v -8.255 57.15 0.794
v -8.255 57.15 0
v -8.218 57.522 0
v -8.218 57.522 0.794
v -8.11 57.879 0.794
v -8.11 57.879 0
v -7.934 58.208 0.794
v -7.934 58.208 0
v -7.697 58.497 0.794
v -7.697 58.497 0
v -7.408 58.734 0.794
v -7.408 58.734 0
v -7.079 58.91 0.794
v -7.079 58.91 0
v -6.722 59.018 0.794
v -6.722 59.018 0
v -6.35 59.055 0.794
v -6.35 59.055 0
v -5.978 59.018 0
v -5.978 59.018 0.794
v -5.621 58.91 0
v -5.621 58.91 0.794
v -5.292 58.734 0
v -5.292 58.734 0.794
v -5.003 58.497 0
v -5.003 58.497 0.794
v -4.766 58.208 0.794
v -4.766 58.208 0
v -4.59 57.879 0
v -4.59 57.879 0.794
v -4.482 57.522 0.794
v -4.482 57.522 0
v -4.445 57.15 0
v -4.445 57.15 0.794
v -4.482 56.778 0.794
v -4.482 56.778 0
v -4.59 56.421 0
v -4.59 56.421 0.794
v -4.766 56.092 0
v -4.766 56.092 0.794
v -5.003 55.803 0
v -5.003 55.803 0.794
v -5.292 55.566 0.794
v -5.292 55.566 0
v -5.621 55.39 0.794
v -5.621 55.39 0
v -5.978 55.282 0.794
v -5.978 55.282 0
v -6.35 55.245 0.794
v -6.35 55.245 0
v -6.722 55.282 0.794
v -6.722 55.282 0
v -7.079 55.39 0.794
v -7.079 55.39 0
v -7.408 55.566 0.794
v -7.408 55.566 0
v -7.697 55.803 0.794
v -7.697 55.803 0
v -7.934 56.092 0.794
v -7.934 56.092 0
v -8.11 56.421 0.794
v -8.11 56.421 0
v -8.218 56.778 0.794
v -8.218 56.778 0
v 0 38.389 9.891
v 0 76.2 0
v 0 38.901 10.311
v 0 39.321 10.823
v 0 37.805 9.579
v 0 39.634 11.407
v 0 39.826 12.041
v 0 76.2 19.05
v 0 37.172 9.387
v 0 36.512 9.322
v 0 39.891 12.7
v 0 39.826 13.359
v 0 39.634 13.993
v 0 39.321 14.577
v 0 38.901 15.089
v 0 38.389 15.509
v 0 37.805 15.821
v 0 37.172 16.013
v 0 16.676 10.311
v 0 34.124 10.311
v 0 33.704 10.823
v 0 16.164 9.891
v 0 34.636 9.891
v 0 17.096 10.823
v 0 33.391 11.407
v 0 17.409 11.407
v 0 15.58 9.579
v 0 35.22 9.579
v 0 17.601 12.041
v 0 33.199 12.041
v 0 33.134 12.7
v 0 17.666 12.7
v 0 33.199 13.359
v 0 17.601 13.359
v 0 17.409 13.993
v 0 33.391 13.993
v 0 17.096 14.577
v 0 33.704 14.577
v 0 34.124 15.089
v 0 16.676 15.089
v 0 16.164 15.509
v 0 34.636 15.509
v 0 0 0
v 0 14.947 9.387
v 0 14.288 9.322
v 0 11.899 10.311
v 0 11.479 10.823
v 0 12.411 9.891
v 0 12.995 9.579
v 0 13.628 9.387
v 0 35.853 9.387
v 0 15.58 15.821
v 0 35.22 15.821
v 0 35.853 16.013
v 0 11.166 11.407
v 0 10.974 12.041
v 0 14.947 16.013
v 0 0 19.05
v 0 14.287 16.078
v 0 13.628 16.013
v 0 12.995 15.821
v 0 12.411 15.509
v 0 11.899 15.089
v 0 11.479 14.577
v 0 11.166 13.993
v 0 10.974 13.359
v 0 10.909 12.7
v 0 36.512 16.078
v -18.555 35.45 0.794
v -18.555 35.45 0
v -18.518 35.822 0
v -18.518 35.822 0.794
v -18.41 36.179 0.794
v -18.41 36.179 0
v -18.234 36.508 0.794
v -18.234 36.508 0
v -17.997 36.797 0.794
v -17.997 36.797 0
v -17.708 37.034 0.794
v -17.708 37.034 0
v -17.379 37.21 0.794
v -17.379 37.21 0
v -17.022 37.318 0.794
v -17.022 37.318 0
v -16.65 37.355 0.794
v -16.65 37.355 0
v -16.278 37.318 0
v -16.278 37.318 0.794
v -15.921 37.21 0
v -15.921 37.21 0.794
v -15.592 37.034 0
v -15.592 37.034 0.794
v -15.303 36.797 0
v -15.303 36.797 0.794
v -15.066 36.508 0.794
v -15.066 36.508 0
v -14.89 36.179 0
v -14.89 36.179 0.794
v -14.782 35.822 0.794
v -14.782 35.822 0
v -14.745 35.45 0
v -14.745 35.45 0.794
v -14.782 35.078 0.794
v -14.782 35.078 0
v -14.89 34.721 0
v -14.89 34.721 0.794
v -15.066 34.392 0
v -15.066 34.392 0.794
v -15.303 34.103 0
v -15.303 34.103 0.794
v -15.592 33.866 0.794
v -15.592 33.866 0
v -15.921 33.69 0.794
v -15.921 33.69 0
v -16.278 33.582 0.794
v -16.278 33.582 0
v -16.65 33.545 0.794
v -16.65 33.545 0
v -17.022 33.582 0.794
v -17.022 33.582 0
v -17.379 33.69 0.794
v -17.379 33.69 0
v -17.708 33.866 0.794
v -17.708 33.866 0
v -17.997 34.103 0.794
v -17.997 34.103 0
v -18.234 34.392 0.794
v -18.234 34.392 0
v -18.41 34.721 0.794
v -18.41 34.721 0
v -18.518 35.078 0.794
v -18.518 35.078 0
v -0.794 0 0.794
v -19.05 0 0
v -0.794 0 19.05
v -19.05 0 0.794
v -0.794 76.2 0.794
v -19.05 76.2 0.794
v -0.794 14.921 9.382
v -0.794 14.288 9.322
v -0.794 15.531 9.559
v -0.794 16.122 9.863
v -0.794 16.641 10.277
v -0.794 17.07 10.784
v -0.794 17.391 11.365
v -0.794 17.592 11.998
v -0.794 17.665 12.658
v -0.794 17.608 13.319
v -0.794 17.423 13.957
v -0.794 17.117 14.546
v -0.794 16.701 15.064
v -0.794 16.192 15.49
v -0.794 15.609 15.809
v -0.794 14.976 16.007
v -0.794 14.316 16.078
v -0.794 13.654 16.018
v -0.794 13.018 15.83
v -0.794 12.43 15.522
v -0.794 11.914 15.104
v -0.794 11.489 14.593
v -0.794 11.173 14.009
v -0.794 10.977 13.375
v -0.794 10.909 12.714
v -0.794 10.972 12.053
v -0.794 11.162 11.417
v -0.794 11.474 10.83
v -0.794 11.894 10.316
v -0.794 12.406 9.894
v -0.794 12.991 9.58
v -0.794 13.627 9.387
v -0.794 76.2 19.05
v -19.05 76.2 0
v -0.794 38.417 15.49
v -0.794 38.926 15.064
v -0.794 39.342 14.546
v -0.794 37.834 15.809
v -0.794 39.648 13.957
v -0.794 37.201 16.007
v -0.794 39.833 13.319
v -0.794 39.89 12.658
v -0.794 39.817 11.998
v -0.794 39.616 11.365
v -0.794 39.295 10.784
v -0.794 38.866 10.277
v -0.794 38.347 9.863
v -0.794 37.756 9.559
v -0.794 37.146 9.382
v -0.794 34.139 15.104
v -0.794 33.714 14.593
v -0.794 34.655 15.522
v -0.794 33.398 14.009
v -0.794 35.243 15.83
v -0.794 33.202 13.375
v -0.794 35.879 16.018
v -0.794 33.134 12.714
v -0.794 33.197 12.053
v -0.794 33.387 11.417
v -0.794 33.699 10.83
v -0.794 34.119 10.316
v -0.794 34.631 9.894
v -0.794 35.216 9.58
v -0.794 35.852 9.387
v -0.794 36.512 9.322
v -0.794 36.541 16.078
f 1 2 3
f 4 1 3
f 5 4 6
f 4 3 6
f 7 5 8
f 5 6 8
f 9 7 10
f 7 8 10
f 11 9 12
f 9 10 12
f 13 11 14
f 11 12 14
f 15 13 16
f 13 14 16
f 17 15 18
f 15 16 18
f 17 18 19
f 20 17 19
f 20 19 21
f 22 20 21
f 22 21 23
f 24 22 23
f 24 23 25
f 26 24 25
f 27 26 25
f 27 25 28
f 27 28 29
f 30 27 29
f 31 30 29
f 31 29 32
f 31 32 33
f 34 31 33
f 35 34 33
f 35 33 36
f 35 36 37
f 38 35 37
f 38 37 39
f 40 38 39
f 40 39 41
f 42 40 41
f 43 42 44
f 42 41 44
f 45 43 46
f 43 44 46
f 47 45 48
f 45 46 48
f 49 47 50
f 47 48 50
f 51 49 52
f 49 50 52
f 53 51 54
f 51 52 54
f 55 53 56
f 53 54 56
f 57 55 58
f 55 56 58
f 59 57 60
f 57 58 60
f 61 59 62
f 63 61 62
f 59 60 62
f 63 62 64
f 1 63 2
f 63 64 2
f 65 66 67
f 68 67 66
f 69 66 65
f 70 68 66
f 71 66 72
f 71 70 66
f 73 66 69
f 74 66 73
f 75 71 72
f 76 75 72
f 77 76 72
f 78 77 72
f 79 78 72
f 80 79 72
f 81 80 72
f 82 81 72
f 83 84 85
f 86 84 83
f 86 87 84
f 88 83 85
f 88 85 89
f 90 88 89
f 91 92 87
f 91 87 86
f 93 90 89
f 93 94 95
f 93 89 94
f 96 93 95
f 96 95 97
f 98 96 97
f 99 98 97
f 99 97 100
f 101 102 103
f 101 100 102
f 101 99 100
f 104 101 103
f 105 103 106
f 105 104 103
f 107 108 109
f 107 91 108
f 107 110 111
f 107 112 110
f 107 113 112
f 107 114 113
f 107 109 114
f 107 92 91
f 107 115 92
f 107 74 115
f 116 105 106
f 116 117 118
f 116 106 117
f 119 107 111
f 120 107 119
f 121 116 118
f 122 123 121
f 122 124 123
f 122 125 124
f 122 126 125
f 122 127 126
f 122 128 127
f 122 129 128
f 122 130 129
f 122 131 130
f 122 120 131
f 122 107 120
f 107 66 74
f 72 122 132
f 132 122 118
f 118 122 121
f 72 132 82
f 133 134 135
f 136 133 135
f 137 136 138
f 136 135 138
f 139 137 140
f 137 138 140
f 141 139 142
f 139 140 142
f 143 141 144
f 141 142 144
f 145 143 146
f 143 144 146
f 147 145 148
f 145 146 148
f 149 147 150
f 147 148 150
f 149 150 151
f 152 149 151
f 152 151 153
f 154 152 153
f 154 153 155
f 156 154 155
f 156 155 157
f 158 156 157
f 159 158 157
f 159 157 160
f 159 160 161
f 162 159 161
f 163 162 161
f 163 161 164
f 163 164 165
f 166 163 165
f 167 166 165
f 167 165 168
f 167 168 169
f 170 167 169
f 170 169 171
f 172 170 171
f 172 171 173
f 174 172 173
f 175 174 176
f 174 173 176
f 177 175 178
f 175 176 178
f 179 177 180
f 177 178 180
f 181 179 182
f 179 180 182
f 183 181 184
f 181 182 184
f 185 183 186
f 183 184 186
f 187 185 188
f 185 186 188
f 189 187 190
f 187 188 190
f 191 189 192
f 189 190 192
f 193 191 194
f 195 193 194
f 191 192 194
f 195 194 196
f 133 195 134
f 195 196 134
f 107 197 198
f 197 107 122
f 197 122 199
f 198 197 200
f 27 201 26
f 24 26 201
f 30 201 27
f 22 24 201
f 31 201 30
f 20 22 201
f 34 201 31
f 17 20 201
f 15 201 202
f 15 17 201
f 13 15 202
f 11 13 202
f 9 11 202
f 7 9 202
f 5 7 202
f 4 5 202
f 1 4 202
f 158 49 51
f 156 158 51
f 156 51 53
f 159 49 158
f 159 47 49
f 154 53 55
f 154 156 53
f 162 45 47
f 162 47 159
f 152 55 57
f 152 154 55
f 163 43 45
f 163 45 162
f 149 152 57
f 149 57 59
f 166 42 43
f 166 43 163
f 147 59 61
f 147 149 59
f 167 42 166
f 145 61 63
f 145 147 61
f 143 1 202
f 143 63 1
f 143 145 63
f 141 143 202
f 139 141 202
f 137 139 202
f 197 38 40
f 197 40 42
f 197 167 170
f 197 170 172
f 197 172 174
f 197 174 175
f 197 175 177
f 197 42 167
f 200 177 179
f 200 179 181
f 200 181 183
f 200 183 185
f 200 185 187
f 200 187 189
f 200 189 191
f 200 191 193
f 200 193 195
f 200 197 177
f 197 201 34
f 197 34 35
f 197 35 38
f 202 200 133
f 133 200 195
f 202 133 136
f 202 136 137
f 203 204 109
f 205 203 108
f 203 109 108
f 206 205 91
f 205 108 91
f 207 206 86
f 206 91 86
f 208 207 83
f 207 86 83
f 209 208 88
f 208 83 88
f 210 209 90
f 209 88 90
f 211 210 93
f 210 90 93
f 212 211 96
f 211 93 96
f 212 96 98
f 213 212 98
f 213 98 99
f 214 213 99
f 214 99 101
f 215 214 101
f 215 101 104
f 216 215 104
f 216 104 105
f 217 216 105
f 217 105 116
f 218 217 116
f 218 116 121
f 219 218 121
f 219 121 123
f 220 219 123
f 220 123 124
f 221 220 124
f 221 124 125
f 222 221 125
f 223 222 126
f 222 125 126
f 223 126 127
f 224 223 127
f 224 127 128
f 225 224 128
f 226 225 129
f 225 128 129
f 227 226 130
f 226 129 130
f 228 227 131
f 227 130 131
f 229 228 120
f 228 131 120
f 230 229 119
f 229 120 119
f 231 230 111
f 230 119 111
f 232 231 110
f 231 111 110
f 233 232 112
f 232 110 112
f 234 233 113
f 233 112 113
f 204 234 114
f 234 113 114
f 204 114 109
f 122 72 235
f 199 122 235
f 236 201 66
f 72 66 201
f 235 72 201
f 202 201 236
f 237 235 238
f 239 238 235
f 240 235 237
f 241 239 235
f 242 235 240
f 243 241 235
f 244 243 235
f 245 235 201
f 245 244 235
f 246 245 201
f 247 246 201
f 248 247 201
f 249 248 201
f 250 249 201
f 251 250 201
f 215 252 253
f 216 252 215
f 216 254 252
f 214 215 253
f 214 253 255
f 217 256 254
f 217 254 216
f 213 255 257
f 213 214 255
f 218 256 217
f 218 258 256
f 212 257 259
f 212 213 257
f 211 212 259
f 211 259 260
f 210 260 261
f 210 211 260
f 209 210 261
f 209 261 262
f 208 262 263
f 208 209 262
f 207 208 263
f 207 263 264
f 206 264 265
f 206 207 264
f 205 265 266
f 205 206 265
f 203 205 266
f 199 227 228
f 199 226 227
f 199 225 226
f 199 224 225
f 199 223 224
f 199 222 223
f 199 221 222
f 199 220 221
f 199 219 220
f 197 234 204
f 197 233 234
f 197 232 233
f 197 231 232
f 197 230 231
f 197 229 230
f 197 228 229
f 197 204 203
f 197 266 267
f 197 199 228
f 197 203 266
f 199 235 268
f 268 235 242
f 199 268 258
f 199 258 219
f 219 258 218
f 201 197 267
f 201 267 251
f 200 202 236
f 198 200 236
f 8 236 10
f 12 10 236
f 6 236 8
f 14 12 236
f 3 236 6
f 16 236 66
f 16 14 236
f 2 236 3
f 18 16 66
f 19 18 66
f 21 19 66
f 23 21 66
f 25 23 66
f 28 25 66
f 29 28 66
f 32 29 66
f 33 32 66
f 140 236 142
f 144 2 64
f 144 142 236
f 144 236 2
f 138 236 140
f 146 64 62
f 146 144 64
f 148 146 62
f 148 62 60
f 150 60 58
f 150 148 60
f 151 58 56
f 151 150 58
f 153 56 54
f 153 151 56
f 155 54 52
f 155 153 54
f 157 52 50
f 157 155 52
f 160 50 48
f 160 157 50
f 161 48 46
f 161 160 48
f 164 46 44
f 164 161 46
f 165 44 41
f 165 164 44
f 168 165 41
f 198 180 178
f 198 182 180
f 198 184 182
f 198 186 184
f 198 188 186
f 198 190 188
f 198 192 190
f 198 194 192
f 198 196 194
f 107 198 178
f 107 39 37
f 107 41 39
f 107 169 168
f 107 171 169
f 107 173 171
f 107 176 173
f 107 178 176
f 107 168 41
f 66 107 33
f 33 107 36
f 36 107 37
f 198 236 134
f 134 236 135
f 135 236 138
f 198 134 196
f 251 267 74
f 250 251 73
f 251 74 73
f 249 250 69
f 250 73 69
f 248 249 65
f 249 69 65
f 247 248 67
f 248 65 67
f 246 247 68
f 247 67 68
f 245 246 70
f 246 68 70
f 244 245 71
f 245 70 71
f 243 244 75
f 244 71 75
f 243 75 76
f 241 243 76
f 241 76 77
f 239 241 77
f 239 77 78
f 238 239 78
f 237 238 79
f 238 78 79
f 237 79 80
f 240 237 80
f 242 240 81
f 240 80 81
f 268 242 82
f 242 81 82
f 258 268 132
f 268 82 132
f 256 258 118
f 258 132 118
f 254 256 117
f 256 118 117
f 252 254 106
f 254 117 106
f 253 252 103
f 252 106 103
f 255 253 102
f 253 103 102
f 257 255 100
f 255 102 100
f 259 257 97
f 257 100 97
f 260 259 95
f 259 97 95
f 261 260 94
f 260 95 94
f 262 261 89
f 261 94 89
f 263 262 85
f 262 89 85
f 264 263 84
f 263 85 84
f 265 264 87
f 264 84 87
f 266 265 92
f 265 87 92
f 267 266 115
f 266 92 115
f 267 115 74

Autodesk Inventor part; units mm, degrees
ref_plane "YZ Plane" through (0, 0, 0) normal (1, 0, 0) x (0, 1, 0)
ref_plane "XZ Plane" through (0, 0, 0) normal (0, 1, 0) x (-1, 0, 0)
ref_plane "XY Plane" through (0, 0, 0) normal (0, 0, 1) x (1, 0, 0)
sketch "Sketch1" plane through (0, 0, 0) normal (0, 1, 0) x (-1, 0, 0)
  line L0 (0, 0) -> (0, 19.05)
  line L1 (0, 19.05) -> (0.7937, 19.05)
  line L2 (0.7937, 19.05) -> (0.7938, 0.7937)
  line L3 (0.7938, 0.7937) -> (19.05, 0.7937)
  line L4 (19.05, 0.7937) -> (19.05, 0)
  line L5 (19.05, 0) -> (0, 0)
  dimension "d0" = 19.05
  dimension "d1" = 0.7937
extrude "Extrusion1" add sketch "Sketch1" along normal blind 76.2
sketch "Sketch2" plane through (0, 0, 19.05) normal (1, 0, 0) x (0, 0, -1)
  line L0 (19.05, 0) -> (19.05, 76.2) projected
  line L1 (6.35, 36.5125) -> (6.35, 14.2875) construction
  circle A0 centre (6.35, 36.5125) radius 3.3782
  circle A1 centre (6.35, 14.2875) radius 3.3782
  line L2 (19.05, 0) -> (0, 0) projected
  dimension "d4" = 22.225
  dimension "d5" = 6.7564
  dimension "d16" = 12.7
  dimension "d17" = 14.2875
extrude "Extrusion2" cut sketch "Sketch2" against normal through all
sketch "Sketch3" plane through (0, 0, 0) normal (0, 0, -1) x (-1, 0, 0)
  line L0 (0, 76.2) -> (19.05, 76.2) projected
  line L1 (0, 0) -> (0, 76.2) projected
  line L2 (16.65, 57.15) -> (6.35, 57.15) construction
  line L3 (6.35, 57.15) -> (6.35, 35.45) construction
  line L4 (6.35, 35.45) -> (16.65, 35.45) construction
  line L5 (16.65, 35.45) -> (16.65, 57.15) construction
  circle A0 centre (16.65, 35.45) radius 1.905
  circle A1 centre (6.35, 57.15) radius 1.905
  dimension "d9" = 3.81
  dimension "d10" = 21.7
  dimension "d11" = 10.3
  dimension "d12" = 19.05
  dimension "d13" = 6.35
extrude "Extrusion3" cut sketch "Sketch3" against normal through all
properties part number "Limit Switch Bracket Shooter Front Right Corner" material "Aluminum 6061"
